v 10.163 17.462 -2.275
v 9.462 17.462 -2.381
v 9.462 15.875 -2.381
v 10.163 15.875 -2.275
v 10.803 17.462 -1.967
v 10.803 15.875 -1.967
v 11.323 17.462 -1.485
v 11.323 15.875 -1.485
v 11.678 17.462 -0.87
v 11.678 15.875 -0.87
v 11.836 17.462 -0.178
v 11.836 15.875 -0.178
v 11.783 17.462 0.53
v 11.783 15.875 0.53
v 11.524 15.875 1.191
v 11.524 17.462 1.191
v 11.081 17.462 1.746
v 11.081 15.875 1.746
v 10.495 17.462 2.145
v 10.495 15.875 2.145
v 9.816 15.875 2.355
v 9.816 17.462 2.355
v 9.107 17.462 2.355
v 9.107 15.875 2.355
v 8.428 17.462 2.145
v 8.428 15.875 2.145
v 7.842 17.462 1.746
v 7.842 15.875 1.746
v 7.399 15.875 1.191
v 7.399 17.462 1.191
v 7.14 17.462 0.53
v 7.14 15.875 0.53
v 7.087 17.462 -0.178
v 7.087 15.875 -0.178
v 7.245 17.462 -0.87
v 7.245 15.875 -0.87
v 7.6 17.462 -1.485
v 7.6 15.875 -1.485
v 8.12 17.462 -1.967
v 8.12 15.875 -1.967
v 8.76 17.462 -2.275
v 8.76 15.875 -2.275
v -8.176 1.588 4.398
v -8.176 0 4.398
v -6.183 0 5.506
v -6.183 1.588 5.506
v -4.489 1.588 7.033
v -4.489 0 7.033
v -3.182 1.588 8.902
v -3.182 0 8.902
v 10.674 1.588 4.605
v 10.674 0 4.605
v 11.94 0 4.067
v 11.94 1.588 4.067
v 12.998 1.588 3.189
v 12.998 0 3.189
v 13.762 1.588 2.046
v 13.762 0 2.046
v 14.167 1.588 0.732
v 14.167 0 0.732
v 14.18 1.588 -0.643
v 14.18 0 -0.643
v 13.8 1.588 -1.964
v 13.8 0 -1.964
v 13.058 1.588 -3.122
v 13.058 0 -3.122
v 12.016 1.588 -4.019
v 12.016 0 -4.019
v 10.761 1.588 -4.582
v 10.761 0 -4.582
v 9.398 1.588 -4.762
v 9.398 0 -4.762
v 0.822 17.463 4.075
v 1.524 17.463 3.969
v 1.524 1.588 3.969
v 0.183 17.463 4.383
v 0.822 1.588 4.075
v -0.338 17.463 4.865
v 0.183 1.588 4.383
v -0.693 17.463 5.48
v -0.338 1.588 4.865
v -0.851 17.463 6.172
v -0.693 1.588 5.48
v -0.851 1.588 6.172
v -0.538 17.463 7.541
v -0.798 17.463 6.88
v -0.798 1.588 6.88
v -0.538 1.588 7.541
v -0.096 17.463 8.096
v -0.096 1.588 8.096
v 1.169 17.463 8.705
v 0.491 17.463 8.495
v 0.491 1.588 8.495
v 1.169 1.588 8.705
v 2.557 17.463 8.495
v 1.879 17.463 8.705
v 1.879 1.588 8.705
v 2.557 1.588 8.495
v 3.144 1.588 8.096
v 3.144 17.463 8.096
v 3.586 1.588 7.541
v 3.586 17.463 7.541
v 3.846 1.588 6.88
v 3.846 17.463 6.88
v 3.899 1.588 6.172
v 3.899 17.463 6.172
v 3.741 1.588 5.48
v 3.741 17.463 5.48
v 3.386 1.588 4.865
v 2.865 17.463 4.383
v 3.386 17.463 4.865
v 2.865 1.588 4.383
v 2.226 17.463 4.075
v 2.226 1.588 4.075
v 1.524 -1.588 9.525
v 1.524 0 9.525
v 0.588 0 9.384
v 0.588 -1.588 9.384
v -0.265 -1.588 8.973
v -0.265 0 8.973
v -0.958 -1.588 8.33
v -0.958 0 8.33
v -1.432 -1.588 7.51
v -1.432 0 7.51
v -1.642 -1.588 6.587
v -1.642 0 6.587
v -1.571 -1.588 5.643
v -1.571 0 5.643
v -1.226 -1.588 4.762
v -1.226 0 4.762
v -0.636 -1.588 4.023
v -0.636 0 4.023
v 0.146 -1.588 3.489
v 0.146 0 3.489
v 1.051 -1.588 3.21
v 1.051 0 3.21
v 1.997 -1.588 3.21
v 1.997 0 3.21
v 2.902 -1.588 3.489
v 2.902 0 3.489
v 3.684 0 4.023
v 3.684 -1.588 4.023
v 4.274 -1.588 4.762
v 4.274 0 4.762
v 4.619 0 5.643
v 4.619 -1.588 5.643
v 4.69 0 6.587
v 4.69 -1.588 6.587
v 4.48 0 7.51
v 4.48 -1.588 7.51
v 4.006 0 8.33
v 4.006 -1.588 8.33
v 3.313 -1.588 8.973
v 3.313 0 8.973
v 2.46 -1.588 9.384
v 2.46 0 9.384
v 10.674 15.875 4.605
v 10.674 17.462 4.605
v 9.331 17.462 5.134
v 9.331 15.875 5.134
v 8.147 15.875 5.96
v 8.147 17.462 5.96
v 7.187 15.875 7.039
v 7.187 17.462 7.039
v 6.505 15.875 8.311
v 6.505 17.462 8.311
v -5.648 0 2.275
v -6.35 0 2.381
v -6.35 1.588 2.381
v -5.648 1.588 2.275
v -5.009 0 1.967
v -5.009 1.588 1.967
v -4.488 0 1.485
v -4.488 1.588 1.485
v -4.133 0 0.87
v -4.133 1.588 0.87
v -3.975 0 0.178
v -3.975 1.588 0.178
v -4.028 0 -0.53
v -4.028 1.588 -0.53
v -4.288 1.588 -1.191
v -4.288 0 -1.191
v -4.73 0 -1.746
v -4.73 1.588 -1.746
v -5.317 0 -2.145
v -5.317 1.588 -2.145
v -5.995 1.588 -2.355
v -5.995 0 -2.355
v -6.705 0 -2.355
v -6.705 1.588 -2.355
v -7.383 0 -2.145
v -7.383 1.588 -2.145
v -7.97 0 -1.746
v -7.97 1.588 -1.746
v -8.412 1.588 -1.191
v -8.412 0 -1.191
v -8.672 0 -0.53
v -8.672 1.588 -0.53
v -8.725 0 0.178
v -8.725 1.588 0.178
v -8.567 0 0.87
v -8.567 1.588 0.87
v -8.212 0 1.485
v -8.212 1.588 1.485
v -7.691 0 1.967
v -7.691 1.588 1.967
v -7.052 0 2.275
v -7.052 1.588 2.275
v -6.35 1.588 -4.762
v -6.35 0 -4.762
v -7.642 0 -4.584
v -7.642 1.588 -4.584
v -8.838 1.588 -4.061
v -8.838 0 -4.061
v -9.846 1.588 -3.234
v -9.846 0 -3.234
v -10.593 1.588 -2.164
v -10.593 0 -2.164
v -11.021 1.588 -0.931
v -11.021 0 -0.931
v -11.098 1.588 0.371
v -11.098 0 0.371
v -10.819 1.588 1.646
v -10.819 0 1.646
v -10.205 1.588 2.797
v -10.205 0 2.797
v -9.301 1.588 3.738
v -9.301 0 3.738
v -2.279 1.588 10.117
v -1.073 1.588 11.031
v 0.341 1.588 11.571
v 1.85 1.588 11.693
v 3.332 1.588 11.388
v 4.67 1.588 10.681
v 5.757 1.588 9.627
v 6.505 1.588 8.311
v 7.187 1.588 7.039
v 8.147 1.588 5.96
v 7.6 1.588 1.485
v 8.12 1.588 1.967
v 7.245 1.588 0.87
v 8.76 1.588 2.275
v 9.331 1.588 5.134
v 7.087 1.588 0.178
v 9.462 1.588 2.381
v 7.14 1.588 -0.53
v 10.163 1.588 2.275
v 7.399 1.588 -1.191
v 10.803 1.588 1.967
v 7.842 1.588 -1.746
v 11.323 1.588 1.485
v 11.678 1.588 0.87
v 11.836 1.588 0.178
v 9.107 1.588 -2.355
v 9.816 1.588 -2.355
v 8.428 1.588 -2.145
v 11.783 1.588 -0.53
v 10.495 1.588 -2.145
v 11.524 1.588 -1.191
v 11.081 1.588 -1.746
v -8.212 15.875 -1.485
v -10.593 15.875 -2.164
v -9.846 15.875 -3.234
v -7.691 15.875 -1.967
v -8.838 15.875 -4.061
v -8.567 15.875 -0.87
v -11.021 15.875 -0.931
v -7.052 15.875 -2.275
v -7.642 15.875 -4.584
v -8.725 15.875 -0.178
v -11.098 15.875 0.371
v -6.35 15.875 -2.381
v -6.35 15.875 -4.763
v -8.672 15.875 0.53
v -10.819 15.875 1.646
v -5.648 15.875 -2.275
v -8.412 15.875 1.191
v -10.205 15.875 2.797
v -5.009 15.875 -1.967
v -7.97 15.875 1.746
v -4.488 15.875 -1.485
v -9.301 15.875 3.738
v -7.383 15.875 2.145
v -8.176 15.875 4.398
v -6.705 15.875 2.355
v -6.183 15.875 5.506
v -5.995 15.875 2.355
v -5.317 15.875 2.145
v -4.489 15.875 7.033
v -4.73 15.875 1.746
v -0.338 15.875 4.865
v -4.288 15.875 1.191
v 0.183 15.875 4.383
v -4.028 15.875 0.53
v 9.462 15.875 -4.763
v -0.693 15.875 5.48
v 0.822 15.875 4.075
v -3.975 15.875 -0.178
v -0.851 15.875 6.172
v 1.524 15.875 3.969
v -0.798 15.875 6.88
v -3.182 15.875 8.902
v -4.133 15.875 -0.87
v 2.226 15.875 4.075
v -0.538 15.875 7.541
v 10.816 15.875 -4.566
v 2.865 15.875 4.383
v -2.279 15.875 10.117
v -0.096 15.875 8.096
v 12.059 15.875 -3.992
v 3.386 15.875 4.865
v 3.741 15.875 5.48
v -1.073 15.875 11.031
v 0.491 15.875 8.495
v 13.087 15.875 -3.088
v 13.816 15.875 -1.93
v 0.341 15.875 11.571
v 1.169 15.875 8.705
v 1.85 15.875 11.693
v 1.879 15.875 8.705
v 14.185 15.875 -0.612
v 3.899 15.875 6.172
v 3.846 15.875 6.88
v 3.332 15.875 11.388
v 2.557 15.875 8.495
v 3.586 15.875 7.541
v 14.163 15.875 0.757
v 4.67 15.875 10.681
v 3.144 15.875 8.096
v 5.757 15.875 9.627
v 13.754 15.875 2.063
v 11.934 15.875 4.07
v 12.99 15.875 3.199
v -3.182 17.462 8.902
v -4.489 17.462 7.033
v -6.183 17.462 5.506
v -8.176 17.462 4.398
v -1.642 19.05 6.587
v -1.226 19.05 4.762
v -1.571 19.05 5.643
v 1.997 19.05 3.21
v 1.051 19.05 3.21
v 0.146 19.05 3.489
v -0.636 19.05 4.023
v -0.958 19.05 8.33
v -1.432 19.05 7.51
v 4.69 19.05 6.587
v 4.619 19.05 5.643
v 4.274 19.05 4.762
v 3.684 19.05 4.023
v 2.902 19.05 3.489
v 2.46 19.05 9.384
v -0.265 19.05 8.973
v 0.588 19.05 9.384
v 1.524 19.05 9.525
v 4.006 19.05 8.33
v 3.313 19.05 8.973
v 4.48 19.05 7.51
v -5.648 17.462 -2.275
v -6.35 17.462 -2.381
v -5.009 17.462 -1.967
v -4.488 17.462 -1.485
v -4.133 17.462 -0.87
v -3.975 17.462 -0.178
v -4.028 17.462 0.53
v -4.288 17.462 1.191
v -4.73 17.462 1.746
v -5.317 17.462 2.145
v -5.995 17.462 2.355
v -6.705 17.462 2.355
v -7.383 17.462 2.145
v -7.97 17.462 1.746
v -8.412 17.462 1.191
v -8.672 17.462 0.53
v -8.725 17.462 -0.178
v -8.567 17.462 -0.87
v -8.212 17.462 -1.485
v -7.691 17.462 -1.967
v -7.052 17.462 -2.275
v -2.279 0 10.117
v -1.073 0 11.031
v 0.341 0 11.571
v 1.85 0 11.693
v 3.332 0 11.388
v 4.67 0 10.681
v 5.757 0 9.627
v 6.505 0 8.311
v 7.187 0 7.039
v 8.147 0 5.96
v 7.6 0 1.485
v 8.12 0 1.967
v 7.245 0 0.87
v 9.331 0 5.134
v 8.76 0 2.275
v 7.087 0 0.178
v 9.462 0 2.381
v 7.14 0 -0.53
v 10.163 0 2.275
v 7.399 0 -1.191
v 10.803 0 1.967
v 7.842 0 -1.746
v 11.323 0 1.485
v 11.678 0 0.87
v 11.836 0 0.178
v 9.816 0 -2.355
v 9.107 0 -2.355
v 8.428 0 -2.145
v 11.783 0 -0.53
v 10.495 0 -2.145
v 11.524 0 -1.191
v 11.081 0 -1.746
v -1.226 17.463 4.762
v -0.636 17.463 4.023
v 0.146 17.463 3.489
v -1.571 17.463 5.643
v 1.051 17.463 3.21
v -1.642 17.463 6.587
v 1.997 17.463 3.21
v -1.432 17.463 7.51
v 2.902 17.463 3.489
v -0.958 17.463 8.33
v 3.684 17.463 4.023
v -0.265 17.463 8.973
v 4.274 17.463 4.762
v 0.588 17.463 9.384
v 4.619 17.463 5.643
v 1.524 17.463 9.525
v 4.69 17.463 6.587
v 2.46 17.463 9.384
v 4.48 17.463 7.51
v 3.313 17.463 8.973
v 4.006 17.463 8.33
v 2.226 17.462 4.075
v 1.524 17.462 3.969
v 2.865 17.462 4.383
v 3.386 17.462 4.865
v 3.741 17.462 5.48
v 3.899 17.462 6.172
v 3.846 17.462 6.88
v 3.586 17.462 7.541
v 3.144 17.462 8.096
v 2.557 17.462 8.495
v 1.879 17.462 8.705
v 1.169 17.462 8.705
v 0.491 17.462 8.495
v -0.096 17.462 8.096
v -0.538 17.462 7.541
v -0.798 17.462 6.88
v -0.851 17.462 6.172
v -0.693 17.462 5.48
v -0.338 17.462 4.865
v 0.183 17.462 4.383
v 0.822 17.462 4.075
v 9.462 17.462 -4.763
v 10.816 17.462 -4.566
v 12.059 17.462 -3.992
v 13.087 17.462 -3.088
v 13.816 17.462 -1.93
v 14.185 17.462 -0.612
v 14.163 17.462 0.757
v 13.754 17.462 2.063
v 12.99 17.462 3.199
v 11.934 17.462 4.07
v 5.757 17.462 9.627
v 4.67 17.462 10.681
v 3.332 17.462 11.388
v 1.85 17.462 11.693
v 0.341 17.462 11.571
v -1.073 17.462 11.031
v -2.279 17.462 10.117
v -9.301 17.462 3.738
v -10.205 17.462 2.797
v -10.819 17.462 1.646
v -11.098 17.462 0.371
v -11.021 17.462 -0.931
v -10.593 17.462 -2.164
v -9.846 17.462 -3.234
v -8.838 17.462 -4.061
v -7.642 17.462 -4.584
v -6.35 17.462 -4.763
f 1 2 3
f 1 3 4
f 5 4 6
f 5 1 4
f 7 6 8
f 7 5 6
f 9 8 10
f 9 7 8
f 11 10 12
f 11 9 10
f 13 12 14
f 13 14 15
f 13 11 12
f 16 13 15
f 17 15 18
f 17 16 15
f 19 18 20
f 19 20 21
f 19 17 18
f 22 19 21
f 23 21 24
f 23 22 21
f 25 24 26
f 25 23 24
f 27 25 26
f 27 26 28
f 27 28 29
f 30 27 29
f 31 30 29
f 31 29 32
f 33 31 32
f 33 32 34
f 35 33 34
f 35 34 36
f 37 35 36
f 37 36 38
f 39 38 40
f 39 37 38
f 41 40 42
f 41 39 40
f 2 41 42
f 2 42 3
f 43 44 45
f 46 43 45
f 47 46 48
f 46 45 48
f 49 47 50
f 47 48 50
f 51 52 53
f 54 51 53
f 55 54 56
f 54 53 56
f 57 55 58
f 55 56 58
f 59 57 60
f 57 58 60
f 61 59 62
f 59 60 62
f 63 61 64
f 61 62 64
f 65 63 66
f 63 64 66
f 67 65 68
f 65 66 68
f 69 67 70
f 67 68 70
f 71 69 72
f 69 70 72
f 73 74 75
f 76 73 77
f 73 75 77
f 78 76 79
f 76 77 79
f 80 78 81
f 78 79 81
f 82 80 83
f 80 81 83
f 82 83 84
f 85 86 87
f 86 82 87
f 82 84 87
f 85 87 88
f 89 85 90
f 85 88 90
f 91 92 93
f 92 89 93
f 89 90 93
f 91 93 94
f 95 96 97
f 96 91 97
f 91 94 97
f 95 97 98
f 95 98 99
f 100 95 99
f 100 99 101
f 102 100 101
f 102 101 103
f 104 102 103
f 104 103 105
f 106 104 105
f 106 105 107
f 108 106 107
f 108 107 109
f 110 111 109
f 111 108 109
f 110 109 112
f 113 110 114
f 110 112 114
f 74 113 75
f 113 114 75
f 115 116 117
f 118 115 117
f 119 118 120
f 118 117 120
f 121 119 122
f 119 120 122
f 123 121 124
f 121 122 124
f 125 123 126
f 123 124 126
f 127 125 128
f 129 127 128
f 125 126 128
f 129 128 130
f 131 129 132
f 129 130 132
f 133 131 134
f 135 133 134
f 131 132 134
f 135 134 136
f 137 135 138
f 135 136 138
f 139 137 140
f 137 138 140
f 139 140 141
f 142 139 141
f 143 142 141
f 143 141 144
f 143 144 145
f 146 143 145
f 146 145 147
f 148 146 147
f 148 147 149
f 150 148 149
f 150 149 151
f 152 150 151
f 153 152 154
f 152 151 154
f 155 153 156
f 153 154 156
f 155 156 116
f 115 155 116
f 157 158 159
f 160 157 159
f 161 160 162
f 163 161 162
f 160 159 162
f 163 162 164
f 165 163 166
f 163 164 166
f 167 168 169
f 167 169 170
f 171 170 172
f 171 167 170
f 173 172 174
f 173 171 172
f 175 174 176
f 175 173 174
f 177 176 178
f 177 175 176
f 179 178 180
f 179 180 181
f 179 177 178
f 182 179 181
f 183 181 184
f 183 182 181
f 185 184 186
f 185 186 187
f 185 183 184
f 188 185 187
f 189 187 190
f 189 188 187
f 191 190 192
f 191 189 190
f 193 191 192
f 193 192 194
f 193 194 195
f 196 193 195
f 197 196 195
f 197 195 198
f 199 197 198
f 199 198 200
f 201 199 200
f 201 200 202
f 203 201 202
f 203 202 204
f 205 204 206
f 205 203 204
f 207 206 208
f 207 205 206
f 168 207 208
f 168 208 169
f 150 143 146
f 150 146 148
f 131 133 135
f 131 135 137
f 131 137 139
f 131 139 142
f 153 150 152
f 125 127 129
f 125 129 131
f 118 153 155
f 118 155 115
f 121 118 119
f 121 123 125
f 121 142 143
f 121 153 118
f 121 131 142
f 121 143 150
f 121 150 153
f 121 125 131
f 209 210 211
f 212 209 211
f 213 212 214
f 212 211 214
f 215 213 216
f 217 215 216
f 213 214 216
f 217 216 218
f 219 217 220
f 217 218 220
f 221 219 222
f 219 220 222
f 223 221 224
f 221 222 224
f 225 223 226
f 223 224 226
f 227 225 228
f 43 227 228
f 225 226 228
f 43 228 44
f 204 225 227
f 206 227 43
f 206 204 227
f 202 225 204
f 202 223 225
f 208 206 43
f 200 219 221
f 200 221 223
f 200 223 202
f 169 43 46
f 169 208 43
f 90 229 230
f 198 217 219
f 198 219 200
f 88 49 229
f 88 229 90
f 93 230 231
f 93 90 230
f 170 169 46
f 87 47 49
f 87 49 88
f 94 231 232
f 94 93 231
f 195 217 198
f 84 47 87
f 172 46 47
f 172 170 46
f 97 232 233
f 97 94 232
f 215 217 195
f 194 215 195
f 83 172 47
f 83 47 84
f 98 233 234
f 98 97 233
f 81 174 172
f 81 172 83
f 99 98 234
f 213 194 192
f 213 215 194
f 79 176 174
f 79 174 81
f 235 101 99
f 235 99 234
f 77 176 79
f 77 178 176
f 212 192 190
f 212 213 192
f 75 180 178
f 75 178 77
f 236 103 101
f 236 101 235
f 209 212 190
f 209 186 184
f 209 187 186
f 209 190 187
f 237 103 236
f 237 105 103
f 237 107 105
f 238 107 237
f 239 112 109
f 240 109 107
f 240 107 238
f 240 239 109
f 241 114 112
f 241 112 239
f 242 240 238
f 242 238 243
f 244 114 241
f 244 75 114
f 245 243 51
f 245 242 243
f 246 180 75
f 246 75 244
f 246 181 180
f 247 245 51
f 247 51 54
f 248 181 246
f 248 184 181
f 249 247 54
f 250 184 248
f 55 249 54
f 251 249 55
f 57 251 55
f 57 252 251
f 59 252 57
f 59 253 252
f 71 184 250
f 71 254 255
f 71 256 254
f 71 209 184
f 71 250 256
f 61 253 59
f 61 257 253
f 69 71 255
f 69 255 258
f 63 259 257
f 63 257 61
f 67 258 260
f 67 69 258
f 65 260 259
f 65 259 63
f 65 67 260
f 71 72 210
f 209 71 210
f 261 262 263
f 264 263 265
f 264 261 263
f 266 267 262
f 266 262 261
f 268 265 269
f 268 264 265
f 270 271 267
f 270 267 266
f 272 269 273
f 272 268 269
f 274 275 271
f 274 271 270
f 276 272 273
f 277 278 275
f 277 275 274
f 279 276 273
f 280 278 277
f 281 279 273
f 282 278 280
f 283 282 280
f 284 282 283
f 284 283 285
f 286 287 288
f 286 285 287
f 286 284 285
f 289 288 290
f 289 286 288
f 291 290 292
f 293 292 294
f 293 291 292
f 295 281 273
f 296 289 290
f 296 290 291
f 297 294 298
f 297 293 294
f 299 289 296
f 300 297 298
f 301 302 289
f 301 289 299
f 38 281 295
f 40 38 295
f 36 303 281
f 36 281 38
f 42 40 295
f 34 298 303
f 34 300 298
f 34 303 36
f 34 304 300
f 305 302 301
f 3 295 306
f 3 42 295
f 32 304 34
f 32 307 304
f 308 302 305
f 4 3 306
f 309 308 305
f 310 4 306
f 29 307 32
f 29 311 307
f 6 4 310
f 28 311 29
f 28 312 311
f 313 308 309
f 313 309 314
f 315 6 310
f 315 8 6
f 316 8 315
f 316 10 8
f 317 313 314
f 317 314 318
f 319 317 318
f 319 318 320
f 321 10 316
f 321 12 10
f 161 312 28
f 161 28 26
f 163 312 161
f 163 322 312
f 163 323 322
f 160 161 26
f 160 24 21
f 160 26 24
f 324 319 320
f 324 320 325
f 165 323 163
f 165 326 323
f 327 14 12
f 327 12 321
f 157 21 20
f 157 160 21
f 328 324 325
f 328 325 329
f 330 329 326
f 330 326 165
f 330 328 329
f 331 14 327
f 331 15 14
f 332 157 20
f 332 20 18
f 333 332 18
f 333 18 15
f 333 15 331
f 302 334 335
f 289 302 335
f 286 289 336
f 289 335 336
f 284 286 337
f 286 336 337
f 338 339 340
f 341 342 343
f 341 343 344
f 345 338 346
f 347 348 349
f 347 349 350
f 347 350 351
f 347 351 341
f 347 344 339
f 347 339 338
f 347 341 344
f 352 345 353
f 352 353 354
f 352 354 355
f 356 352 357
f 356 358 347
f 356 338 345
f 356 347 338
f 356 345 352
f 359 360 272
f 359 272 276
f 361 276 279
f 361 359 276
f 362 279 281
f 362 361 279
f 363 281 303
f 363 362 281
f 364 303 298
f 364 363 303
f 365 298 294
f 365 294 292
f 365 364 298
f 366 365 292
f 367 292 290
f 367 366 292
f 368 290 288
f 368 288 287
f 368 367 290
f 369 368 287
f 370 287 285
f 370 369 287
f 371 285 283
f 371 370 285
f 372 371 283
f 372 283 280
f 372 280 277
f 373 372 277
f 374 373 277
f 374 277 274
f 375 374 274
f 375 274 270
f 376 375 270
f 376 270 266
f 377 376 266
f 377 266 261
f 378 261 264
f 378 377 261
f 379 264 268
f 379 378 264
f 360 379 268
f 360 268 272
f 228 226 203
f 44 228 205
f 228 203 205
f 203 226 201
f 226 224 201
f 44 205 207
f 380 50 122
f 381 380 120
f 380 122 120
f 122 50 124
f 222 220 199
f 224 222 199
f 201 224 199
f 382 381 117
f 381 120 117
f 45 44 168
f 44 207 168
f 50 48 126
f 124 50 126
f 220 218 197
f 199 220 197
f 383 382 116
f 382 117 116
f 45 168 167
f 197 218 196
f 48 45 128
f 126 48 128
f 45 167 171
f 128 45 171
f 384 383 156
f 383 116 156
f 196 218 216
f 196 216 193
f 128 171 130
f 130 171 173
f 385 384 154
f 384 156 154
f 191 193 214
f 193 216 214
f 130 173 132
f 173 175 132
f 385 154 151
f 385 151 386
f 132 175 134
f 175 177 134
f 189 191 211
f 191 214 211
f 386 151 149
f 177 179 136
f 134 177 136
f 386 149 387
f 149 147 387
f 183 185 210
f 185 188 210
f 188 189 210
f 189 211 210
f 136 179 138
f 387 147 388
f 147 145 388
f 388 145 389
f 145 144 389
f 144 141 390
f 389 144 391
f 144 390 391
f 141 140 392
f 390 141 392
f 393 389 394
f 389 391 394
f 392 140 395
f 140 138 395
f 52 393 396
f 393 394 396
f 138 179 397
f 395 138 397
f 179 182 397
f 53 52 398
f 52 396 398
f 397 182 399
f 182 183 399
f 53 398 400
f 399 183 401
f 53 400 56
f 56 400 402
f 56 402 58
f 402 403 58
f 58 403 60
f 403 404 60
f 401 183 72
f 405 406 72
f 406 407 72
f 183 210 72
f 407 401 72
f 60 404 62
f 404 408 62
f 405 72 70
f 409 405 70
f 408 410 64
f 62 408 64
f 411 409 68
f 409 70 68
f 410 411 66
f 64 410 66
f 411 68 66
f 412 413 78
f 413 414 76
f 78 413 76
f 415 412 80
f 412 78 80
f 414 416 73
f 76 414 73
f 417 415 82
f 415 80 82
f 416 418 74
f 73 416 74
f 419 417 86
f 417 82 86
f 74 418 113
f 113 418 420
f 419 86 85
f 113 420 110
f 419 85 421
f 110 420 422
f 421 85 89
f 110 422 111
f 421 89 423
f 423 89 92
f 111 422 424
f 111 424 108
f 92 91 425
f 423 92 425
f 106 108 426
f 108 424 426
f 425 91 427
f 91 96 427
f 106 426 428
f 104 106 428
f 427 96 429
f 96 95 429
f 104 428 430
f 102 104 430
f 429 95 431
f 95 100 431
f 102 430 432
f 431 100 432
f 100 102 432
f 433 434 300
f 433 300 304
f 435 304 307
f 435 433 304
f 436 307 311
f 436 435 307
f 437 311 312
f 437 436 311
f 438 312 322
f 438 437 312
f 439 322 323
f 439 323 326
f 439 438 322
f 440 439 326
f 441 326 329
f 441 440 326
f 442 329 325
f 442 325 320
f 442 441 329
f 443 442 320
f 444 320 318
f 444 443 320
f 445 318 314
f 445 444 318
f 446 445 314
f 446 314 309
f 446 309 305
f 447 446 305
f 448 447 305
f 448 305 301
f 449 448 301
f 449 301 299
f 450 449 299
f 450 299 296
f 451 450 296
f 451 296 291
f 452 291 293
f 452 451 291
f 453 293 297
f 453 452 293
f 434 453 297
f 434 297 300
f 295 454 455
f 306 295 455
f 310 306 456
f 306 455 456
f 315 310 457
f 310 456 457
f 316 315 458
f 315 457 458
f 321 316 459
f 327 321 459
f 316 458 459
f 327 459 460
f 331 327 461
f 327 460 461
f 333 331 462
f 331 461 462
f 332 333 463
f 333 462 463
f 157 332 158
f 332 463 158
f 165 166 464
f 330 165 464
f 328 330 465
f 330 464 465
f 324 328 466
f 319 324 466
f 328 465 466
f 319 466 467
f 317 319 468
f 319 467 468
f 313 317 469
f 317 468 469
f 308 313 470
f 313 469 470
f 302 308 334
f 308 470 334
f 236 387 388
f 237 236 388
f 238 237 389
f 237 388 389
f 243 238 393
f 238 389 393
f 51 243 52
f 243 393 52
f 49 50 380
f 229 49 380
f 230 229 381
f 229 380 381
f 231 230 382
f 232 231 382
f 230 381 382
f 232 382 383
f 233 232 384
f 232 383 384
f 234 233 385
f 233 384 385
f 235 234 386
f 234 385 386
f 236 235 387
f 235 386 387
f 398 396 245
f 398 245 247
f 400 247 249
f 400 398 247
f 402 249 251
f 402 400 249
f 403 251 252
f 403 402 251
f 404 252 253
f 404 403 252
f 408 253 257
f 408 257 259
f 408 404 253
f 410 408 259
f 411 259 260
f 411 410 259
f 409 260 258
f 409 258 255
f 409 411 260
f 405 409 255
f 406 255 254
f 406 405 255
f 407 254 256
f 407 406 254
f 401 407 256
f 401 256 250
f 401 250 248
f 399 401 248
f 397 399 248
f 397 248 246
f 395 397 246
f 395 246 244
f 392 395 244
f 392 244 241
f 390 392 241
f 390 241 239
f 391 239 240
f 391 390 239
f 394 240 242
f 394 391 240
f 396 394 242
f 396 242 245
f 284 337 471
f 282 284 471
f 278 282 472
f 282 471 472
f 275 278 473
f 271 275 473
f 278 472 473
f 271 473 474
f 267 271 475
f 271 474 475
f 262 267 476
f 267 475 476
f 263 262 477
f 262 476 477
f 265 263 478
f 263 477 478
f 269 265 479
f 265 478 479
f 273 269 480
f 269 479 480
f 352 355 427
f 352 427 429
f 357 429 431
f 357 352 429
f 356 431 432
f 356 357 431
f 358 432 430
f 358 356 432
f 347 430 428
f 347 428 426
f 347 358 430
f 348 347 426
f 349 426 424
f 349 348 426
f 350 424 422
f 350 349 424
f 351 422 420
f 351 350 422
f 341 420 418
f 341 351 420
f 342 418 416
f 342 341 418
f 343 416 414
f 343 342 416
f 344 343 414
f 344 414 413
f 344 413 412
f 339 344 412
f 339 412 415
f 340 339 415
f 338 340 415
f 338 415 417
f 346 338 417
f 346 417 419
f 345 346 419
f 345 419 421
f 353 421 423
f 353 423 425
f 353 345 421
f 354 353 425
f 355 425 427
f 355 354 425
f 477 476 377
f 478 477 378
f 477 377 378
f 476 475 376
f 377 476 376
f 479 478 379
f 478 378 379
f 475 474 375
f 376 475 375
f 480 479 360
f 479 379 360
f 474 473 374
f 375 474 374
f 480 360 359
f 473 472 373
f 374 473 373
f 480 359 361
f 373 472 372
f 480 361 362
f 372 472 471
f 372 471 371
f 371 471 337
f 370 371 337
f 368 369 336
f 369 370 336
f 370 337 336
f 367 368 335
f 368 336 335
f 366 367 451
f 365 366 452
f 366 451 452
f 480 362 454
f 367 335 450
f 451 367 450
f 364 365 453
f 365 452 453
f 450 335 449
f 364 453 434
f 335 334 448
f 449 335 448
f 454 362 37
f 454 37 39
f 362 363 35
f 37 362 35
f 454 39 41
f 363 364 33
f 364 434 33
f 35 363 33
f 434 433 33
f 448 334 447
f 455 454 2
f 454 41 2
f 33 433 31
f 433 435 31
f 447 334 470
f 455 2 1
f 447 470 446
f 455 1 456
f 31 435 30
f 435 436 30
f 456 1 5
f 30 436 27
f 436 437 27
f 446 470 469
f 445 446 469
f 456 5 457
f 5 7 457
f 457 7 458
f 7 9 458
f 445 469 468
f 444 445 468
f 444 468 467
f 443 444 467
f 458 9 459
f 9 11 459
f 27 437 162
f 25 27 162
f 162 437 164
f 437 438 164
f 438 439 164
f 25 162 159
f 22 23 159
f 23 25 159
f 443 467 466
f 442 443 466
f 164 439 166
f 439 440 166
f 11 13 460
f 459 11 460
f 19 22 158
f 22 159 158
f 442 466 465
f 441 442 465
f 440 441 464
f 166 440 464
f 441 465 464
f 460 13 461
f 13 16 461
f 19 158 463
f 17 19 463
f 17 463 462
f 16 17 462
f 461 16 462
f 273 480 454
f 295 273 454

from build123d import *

# Parameters (mm, degrees)
SKETCH1_R           = 2.38125
BOSS_EXTRUDE1_DEPTH = 1.5875
SKETCH2_R           = 3.175
BOSS_EXTRUDE2_DEPTH = 1.5875
SKETCH3_R           = 2.38125
BOSS_EXTRUDE3_DEPTH = 19.05
SKETCH4_R           = 3.175
BOSS_EXTRUDE4_DEPTH = 1.5875
SKETCH5_R           = 2.38125
BOSS_EXTRUDE5_DEPTH = 1.5875


with BuildPart() as part:
    # Sketch1 → Boss-Extrude1 (new body)
    with BuildSketch(Plane(origin=(0, 0, 0), x_dir=(1, 0, 0), z_dir=(0, 1, 0))):
        with BuildLine():
            Line((9.398005644, 4.762076723), (-6.35, 4.7625))
            ThreePointArc((-6.35, 4.7625), (-11.020584629, 0.931152767), (-8.176363381, -4.398386414))
            ThreePointArc((-8.176363381, -4.398386414), (-5.292234705, -6.221263486), (-3.181508348, -8.901918869))
            ThreePointArc((-3.181508348, -8.901918869), (1.849687492, -11.693035316), (6.504625866, -8.311495529))
            ThreePointArc((6.504625866, -8.311495529), (8.146827792, -5.96033805), (10.67447942, -4.60544104))
            ThreePointArc((10.67447942, -4.60544104), (14.180390361, 0.643024113), (9.398005644, 4.762076723))
        make_face()
        with Locations(Location((-6.35, 0, 0), (0, 0, 270))):
            Circle(SKETCH1_R, mode=Mode.SUBTRACT)
        with Locations(Location((9.4615, 0, 0), (0, 0, 270))):
            Circle(SKETCH1_R, mode=Mode.SUBTRACT)
        with Locations(Location((1.524, -6.35, 0), (0, 0, 270))):
            Circle(SKETCH1_R, mode=Mode.SUBTRACT)
    extrude(amount=BOSS_EXTRUDE1_DEPTH)

    # Sketch2 → Boss-Extrude2 (add)
    with BuildSketch(Plane.XZ):
        with Locations(Location((1.524, 6.35, 0), (0, 0, 90))):
            Circle(SKETCH2_R)
    extrude(amount=BOSS_EXTRUDE2_DEPTH)

    # Sketch3 → Boss-Extrude3 (add)
    with BuildSketch(Plane(origin=(0, 0, 0), x_dir=(1, 0, 0), z_dir=(0, 1, 0))):
        with Locations(Location((1.524, -6.35, 0), (0, 0, 90))):
            Circle(SKETCH3_R)
    extrude(amount=BOSS_EXTRUDE3_DEPTH)

    # Sketch4 → Boss-Extrude4 (add)
    with BuildSketch(Plane(origin=(0, 19.05, 0), x_dir=(1, 0, 0), z_dir=(0, 1, 0))):
        with Locations(Location((1.524, -6.35, 0), (0, 0, 270))):
            Circle(SKETCH4_R)
    extrude(amount=-BOSS_EXTRUDE4_DEPTH)


with BuildPart() as body_2:
    # Sketch5 → Boss-Extrude5 (new body)
    with BuildSketch(Plane.XZ.offset(-17.4625)):
        with BuildLine():
            ThreePointArc((-8.176363381, 4.398386414), (-11.020584629, -0.931152767), (-6.35, -4.7625))
            Line((-6.35, -4.7625), (9.4615, -4.7625))
            ThreePointArc((9.4615, -4.7625), (14.184572051, -0.611552653), (10.67447942, 4.60544104))
            ThreePointArc((10.67447942, 4.60544104), (8.146827792, 5.96033805), (6.504625866, 8.311495529))
            ThreePointArc((6.504625866, 8.311495529), (1.849687492, 11.693035316), (-3.181508348, 8.901918869))
            ThreePointArc((-3.181508348, 8.901918869), (-5.292234705, 6.221263486), (-8.176363381, 4.398386414))
        make_face()
        with Locations(Location((-6.35, 0, 0), (0, 0, 270))):
            Circle(SKETCH5_R, mode=Mode.SUBTRACT)
        with Locations(Location((9.4615, 0, 0), (0, 0, 270))):
            Circle(SKETCH5_R, mode=Mode.SUBTRACT)
        with Locations(Location((1.524, 6.35, 0), (0, 0, 270))):
            Circle(SKETCH5_R, mode=Mode.SUBTRACT)
    extrude(amount=BOSS_EXTRUDE5_DEPTH)


solid = Compound([part.part, body_2.part])
